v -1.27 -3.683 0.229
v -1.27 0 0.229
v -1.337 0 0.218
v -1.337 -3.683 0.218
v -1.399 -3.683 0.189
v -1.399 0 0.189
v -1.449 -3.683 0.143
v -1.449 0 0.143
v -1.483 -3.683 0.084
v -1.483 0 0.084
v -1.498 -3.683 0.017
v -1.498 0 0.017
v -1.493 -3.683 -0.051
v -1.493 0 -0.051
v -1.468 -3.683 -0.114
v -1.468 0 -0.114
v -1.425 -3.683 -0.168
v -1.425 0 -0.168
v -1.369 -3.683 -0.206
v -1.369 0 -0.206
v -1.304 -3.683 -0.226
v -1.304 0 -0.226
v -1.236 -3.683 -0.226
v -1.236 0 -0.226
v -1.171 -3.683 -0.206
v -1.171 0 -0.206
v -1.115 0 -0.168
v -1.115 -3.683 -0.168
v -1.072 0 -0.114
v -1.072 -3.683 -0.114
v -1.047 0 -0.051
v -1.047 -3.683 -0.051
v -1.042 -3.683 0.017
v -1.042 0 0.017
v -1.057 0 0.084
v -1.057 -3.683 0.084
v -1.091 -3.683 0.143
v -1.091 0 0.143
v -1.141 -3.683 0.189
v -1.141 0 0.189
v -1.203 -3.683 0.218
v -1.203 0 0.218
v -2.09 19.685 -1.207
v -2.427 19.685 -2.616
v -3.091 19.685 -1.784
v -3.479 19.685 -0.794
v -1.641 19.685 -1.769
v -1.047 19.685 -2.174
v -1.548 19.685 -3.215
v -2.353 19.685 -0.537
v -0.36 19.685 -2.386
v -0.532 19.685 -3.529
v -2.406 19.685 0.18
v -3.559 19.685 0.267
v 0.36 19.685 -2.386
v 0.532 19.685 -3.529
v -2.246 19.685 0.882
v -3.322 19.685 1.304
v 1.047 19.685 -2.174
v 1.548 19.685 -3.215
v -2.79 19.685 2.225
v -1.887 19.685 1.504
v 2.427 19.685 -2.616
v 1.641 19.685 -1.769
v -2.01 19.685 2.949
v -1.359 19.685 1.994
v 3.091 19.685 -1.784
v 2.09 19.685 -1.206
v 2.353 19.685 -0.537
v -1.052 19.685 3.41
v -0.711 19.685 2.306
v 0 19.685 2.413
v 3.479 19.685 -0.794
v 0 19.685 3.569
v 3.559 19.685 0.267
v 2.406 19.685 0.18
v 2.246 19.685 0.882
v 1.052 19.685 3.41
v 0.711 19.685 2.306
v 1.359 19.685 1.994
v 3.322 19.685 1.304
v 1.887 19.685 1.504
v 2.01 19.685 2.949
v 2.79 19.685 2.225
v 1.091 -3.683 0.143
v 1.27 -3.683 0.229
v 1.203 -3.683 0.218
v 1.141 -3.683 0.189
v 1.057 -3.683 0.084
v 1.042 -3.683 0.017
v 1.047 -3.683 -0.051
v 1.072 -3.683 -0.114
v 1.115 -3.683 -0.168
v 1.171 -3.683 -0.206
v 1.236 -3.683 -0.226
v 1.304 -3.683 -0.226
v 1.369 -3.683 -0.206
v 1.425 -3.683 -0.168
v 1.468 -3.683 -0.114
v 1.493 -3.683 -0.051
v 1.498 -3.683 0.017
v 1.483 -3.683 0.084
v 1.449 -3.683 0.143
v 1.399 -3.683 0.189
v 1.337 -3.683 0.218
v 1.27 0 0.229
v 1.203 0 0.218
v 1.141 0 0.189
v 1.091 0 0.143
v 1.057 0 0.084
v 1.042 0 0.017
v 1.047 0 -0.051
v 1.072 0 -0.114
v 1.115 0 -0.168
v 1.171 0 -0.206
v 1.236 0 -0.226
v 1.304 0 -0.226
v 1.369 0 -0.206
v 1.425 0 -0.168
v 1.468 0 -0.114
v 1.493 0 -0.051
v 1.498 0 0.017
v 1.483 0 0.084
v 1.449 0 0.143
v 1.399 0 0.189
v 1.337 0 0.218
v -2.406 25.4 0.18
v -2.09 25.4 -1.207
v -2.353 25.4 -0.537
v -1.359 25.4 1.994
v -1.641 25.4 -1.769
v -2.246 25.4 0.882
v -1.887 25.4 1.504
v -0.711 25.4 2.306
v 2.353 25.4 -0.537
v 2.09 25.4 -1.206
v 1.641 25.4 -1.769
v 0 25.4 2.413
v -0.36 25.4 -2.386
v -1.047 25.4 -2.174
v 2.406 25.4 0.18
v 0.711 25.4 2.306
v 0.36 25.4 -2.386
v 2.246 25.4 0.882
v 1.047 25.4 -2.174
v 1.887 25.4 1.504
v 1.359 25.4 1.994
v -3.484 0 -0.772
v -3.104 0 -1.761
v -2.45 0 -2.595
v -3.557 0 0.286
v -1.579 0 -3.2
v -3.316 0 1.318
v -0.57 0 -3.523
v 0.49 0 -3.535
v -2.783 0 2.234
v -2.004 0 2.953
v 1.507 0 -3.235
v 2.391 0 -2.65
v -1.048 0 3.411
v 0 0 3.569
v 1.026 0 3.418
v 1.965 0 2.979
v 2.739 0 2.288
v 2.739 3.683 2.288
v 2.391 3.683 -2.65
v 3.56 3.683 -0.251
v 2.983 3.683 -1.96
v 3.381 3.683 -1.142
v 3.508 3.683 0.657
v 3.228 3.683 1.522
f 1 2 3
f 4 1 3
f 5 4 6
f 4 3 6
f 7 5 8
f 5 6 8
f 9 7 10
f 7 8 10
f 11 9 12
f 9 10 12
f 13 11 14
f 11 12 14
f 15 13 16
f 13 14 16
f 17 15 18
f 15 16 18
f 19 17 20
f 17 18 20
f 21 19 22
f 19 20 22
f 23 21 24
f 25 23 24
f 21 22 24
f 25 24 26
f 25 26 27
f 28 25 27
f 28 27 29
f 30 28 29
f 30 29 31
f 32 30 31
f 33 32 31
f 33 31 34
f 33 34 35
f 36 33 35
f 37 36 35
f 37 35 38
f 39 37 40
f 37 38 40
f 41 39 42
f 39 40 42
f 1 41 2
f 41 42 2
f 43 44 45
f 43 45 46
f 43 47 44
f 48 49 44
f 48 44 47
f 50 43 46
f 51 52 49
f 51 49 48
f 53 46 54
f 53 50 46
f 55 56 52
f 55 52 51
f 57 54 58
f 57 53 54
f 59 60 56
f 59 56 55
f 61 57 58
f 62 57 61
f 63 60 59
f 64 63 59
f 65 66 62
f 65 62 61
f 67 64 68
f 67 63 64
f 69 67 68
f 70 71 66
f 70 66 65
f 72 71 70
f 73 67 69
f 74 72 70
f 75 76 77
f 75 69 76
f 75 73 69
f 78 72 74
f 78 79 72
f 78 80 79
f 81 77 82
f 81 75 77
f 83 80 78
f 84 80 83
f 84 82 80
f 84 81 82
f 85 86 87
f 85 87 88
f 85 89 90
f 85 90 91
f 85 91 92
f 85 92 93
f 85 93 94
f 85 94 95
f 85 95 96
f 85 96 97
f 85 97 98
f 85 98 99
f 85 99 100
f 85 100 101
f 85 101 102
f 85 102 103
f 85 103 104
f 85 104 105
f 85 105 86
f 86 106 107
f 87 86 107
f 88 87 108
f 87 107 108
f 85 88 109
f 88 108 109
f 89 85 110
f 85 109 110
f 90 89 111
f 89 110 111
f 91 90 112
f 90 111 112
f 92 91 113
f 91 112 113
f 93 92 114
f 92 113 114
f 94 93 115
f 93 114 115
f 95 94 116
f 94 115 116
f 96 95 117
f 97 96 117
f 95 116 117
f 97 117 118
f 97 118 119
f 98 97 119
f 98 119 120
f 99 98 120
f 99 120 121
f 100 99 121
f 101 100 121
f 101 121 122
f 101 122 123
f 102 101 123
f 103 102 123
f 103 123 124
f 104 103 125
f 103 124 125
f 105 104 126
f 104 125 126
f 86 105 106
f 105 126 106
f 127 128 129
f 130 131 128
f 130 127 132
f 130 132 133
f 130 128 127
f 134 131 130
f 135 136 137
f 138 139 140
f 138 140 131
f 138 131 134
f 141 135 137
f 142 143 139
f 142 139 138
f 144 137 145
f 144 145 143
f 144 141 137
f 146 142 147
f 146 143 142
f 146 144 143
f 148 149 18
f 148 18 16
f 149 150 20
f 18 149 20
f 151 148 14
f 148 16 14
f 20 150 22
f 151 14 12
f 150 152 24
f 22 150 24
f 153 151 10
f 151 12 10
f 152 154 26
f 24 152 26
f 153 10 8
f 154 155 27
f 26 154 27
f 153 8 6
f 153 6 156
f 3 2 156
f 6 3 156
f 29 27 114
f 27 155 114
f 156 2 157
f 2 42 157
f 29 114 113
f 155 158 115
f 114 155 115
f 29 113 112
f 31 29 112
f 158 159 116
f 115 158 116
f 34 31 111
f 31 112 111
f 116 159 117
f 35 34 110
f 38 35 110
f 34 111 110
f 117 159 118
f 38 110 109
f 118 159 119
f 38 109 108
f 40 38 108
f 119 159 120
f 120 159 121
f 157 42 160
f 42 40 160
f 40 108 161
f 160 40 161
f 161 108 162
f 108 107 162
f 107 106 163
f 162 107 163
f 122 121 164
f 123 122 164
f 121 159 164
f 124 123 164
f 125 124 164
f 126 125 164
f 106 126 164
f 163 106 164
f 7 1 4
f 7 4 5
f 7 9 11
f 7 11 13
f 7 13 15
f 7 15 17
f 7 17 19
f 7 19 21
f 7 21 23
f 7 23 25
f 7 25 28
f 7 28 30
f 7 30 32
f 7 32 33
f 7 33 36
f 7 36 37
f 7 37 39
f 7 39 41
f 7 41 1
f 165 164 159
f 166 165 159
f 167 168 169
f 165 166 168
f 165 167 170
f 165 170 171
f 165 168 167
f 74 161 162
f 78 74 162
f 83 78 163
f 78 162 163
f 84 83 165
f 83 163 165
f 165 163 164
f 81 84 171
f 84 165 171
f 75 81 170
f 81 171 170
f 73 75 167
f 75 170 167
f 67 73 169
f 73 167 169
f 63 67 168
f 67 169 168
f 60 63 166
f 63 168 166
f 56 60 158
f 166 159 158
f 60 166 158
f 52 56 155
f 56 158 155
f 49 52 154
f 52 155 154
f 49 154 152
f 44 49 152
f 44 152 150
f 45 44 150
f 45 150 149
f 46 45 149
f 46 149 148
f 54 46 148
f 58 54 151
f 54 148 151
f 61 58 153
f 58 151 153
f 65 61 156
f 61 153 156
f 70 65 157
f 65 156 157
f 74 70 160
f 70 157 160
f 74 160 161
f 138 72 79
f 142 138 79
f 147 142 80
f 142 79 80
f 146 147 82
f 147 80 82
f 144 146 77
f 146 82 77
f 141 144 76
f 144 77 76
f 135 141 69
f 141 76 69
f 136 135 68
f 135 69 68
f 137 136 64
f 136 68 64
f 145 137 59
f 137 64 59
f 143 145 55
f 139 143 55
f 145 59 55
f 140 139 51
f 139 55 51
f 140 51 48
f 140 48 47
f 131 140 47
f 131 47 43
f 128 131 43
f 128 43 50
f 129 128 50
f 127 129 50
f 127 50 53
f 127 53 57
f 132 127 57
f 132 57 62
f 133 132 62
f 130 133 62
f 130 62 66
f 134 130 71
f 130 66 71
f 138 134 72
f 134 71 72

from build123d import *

# Parameters (mm, degrees)
SKETCH1_R           = 3.5687
BOSS_EXTRUDE1_DEPTH = 19.685
SKETCH2_R           = 2.413
BOSS_EXTRUDE2_DEPTH = 5.715
SKETCH3_R           = 0.2286
BOSS_EXTRUDE3_DEPTH = 3.683
CUT_EXTRUDE1_DEPTH  = 3.683


with BuildPart() as part:
    # Sketch1 → Boss-Extrude1 (new body)
    with BuildSketch(Plane(origin=(0, 0, 0), x_dir=(1, 0, 0), z_dir=(0, 1, 0))):
        with Locations(Location((0, 0, 0), (0, 0, 270))):
            Circle(SKETCH1_R)
    extrude(amount=BOSS_EXTRUDE1_DEPTH)

    # Sketch2 → Boss-Extrude2 (add)
    with BuildSketch(Plane(origin=(0, 19.685, 0), x_dir=(1, 0, 0), z_dir=(0, 1, 0))):
        with Locations(Location((0, 0, 0), (0, 0, 270))):
            Circle(SKETCH2_R)
    extrude(amount=BOSS_EXTRUDE2_DEPTH)

    # Sketch3 → Boss-Extrude3 (add)
    with BuildSketch(Plane.XZ):
        with Locations(Location((1.27, 0, 0), (0, 0, 90))):
            Circle(SKETCH3_R)
        with Locations(Location((-1.27, 0, 0), (0, 0, 90))):
            Circle(SKETCH3_R)
    extrude(amount=BOSS_EXTRUDE3_DEPTH)

    # Sketch4 → Cut-Extrude1 (cut)
    with BuildSketch(Plane.XZ):
        Polygon((2.738767967, 2.287961912), (2.390573782, -2.649674826), (3.144962665, -2.702873114), (4.333390191, 2.287961912), align=None)
    extrude(amount=-CUT_EXTRUDE1_DEPTH, mode=Mode.SUBTRACT)


solid = part.part
